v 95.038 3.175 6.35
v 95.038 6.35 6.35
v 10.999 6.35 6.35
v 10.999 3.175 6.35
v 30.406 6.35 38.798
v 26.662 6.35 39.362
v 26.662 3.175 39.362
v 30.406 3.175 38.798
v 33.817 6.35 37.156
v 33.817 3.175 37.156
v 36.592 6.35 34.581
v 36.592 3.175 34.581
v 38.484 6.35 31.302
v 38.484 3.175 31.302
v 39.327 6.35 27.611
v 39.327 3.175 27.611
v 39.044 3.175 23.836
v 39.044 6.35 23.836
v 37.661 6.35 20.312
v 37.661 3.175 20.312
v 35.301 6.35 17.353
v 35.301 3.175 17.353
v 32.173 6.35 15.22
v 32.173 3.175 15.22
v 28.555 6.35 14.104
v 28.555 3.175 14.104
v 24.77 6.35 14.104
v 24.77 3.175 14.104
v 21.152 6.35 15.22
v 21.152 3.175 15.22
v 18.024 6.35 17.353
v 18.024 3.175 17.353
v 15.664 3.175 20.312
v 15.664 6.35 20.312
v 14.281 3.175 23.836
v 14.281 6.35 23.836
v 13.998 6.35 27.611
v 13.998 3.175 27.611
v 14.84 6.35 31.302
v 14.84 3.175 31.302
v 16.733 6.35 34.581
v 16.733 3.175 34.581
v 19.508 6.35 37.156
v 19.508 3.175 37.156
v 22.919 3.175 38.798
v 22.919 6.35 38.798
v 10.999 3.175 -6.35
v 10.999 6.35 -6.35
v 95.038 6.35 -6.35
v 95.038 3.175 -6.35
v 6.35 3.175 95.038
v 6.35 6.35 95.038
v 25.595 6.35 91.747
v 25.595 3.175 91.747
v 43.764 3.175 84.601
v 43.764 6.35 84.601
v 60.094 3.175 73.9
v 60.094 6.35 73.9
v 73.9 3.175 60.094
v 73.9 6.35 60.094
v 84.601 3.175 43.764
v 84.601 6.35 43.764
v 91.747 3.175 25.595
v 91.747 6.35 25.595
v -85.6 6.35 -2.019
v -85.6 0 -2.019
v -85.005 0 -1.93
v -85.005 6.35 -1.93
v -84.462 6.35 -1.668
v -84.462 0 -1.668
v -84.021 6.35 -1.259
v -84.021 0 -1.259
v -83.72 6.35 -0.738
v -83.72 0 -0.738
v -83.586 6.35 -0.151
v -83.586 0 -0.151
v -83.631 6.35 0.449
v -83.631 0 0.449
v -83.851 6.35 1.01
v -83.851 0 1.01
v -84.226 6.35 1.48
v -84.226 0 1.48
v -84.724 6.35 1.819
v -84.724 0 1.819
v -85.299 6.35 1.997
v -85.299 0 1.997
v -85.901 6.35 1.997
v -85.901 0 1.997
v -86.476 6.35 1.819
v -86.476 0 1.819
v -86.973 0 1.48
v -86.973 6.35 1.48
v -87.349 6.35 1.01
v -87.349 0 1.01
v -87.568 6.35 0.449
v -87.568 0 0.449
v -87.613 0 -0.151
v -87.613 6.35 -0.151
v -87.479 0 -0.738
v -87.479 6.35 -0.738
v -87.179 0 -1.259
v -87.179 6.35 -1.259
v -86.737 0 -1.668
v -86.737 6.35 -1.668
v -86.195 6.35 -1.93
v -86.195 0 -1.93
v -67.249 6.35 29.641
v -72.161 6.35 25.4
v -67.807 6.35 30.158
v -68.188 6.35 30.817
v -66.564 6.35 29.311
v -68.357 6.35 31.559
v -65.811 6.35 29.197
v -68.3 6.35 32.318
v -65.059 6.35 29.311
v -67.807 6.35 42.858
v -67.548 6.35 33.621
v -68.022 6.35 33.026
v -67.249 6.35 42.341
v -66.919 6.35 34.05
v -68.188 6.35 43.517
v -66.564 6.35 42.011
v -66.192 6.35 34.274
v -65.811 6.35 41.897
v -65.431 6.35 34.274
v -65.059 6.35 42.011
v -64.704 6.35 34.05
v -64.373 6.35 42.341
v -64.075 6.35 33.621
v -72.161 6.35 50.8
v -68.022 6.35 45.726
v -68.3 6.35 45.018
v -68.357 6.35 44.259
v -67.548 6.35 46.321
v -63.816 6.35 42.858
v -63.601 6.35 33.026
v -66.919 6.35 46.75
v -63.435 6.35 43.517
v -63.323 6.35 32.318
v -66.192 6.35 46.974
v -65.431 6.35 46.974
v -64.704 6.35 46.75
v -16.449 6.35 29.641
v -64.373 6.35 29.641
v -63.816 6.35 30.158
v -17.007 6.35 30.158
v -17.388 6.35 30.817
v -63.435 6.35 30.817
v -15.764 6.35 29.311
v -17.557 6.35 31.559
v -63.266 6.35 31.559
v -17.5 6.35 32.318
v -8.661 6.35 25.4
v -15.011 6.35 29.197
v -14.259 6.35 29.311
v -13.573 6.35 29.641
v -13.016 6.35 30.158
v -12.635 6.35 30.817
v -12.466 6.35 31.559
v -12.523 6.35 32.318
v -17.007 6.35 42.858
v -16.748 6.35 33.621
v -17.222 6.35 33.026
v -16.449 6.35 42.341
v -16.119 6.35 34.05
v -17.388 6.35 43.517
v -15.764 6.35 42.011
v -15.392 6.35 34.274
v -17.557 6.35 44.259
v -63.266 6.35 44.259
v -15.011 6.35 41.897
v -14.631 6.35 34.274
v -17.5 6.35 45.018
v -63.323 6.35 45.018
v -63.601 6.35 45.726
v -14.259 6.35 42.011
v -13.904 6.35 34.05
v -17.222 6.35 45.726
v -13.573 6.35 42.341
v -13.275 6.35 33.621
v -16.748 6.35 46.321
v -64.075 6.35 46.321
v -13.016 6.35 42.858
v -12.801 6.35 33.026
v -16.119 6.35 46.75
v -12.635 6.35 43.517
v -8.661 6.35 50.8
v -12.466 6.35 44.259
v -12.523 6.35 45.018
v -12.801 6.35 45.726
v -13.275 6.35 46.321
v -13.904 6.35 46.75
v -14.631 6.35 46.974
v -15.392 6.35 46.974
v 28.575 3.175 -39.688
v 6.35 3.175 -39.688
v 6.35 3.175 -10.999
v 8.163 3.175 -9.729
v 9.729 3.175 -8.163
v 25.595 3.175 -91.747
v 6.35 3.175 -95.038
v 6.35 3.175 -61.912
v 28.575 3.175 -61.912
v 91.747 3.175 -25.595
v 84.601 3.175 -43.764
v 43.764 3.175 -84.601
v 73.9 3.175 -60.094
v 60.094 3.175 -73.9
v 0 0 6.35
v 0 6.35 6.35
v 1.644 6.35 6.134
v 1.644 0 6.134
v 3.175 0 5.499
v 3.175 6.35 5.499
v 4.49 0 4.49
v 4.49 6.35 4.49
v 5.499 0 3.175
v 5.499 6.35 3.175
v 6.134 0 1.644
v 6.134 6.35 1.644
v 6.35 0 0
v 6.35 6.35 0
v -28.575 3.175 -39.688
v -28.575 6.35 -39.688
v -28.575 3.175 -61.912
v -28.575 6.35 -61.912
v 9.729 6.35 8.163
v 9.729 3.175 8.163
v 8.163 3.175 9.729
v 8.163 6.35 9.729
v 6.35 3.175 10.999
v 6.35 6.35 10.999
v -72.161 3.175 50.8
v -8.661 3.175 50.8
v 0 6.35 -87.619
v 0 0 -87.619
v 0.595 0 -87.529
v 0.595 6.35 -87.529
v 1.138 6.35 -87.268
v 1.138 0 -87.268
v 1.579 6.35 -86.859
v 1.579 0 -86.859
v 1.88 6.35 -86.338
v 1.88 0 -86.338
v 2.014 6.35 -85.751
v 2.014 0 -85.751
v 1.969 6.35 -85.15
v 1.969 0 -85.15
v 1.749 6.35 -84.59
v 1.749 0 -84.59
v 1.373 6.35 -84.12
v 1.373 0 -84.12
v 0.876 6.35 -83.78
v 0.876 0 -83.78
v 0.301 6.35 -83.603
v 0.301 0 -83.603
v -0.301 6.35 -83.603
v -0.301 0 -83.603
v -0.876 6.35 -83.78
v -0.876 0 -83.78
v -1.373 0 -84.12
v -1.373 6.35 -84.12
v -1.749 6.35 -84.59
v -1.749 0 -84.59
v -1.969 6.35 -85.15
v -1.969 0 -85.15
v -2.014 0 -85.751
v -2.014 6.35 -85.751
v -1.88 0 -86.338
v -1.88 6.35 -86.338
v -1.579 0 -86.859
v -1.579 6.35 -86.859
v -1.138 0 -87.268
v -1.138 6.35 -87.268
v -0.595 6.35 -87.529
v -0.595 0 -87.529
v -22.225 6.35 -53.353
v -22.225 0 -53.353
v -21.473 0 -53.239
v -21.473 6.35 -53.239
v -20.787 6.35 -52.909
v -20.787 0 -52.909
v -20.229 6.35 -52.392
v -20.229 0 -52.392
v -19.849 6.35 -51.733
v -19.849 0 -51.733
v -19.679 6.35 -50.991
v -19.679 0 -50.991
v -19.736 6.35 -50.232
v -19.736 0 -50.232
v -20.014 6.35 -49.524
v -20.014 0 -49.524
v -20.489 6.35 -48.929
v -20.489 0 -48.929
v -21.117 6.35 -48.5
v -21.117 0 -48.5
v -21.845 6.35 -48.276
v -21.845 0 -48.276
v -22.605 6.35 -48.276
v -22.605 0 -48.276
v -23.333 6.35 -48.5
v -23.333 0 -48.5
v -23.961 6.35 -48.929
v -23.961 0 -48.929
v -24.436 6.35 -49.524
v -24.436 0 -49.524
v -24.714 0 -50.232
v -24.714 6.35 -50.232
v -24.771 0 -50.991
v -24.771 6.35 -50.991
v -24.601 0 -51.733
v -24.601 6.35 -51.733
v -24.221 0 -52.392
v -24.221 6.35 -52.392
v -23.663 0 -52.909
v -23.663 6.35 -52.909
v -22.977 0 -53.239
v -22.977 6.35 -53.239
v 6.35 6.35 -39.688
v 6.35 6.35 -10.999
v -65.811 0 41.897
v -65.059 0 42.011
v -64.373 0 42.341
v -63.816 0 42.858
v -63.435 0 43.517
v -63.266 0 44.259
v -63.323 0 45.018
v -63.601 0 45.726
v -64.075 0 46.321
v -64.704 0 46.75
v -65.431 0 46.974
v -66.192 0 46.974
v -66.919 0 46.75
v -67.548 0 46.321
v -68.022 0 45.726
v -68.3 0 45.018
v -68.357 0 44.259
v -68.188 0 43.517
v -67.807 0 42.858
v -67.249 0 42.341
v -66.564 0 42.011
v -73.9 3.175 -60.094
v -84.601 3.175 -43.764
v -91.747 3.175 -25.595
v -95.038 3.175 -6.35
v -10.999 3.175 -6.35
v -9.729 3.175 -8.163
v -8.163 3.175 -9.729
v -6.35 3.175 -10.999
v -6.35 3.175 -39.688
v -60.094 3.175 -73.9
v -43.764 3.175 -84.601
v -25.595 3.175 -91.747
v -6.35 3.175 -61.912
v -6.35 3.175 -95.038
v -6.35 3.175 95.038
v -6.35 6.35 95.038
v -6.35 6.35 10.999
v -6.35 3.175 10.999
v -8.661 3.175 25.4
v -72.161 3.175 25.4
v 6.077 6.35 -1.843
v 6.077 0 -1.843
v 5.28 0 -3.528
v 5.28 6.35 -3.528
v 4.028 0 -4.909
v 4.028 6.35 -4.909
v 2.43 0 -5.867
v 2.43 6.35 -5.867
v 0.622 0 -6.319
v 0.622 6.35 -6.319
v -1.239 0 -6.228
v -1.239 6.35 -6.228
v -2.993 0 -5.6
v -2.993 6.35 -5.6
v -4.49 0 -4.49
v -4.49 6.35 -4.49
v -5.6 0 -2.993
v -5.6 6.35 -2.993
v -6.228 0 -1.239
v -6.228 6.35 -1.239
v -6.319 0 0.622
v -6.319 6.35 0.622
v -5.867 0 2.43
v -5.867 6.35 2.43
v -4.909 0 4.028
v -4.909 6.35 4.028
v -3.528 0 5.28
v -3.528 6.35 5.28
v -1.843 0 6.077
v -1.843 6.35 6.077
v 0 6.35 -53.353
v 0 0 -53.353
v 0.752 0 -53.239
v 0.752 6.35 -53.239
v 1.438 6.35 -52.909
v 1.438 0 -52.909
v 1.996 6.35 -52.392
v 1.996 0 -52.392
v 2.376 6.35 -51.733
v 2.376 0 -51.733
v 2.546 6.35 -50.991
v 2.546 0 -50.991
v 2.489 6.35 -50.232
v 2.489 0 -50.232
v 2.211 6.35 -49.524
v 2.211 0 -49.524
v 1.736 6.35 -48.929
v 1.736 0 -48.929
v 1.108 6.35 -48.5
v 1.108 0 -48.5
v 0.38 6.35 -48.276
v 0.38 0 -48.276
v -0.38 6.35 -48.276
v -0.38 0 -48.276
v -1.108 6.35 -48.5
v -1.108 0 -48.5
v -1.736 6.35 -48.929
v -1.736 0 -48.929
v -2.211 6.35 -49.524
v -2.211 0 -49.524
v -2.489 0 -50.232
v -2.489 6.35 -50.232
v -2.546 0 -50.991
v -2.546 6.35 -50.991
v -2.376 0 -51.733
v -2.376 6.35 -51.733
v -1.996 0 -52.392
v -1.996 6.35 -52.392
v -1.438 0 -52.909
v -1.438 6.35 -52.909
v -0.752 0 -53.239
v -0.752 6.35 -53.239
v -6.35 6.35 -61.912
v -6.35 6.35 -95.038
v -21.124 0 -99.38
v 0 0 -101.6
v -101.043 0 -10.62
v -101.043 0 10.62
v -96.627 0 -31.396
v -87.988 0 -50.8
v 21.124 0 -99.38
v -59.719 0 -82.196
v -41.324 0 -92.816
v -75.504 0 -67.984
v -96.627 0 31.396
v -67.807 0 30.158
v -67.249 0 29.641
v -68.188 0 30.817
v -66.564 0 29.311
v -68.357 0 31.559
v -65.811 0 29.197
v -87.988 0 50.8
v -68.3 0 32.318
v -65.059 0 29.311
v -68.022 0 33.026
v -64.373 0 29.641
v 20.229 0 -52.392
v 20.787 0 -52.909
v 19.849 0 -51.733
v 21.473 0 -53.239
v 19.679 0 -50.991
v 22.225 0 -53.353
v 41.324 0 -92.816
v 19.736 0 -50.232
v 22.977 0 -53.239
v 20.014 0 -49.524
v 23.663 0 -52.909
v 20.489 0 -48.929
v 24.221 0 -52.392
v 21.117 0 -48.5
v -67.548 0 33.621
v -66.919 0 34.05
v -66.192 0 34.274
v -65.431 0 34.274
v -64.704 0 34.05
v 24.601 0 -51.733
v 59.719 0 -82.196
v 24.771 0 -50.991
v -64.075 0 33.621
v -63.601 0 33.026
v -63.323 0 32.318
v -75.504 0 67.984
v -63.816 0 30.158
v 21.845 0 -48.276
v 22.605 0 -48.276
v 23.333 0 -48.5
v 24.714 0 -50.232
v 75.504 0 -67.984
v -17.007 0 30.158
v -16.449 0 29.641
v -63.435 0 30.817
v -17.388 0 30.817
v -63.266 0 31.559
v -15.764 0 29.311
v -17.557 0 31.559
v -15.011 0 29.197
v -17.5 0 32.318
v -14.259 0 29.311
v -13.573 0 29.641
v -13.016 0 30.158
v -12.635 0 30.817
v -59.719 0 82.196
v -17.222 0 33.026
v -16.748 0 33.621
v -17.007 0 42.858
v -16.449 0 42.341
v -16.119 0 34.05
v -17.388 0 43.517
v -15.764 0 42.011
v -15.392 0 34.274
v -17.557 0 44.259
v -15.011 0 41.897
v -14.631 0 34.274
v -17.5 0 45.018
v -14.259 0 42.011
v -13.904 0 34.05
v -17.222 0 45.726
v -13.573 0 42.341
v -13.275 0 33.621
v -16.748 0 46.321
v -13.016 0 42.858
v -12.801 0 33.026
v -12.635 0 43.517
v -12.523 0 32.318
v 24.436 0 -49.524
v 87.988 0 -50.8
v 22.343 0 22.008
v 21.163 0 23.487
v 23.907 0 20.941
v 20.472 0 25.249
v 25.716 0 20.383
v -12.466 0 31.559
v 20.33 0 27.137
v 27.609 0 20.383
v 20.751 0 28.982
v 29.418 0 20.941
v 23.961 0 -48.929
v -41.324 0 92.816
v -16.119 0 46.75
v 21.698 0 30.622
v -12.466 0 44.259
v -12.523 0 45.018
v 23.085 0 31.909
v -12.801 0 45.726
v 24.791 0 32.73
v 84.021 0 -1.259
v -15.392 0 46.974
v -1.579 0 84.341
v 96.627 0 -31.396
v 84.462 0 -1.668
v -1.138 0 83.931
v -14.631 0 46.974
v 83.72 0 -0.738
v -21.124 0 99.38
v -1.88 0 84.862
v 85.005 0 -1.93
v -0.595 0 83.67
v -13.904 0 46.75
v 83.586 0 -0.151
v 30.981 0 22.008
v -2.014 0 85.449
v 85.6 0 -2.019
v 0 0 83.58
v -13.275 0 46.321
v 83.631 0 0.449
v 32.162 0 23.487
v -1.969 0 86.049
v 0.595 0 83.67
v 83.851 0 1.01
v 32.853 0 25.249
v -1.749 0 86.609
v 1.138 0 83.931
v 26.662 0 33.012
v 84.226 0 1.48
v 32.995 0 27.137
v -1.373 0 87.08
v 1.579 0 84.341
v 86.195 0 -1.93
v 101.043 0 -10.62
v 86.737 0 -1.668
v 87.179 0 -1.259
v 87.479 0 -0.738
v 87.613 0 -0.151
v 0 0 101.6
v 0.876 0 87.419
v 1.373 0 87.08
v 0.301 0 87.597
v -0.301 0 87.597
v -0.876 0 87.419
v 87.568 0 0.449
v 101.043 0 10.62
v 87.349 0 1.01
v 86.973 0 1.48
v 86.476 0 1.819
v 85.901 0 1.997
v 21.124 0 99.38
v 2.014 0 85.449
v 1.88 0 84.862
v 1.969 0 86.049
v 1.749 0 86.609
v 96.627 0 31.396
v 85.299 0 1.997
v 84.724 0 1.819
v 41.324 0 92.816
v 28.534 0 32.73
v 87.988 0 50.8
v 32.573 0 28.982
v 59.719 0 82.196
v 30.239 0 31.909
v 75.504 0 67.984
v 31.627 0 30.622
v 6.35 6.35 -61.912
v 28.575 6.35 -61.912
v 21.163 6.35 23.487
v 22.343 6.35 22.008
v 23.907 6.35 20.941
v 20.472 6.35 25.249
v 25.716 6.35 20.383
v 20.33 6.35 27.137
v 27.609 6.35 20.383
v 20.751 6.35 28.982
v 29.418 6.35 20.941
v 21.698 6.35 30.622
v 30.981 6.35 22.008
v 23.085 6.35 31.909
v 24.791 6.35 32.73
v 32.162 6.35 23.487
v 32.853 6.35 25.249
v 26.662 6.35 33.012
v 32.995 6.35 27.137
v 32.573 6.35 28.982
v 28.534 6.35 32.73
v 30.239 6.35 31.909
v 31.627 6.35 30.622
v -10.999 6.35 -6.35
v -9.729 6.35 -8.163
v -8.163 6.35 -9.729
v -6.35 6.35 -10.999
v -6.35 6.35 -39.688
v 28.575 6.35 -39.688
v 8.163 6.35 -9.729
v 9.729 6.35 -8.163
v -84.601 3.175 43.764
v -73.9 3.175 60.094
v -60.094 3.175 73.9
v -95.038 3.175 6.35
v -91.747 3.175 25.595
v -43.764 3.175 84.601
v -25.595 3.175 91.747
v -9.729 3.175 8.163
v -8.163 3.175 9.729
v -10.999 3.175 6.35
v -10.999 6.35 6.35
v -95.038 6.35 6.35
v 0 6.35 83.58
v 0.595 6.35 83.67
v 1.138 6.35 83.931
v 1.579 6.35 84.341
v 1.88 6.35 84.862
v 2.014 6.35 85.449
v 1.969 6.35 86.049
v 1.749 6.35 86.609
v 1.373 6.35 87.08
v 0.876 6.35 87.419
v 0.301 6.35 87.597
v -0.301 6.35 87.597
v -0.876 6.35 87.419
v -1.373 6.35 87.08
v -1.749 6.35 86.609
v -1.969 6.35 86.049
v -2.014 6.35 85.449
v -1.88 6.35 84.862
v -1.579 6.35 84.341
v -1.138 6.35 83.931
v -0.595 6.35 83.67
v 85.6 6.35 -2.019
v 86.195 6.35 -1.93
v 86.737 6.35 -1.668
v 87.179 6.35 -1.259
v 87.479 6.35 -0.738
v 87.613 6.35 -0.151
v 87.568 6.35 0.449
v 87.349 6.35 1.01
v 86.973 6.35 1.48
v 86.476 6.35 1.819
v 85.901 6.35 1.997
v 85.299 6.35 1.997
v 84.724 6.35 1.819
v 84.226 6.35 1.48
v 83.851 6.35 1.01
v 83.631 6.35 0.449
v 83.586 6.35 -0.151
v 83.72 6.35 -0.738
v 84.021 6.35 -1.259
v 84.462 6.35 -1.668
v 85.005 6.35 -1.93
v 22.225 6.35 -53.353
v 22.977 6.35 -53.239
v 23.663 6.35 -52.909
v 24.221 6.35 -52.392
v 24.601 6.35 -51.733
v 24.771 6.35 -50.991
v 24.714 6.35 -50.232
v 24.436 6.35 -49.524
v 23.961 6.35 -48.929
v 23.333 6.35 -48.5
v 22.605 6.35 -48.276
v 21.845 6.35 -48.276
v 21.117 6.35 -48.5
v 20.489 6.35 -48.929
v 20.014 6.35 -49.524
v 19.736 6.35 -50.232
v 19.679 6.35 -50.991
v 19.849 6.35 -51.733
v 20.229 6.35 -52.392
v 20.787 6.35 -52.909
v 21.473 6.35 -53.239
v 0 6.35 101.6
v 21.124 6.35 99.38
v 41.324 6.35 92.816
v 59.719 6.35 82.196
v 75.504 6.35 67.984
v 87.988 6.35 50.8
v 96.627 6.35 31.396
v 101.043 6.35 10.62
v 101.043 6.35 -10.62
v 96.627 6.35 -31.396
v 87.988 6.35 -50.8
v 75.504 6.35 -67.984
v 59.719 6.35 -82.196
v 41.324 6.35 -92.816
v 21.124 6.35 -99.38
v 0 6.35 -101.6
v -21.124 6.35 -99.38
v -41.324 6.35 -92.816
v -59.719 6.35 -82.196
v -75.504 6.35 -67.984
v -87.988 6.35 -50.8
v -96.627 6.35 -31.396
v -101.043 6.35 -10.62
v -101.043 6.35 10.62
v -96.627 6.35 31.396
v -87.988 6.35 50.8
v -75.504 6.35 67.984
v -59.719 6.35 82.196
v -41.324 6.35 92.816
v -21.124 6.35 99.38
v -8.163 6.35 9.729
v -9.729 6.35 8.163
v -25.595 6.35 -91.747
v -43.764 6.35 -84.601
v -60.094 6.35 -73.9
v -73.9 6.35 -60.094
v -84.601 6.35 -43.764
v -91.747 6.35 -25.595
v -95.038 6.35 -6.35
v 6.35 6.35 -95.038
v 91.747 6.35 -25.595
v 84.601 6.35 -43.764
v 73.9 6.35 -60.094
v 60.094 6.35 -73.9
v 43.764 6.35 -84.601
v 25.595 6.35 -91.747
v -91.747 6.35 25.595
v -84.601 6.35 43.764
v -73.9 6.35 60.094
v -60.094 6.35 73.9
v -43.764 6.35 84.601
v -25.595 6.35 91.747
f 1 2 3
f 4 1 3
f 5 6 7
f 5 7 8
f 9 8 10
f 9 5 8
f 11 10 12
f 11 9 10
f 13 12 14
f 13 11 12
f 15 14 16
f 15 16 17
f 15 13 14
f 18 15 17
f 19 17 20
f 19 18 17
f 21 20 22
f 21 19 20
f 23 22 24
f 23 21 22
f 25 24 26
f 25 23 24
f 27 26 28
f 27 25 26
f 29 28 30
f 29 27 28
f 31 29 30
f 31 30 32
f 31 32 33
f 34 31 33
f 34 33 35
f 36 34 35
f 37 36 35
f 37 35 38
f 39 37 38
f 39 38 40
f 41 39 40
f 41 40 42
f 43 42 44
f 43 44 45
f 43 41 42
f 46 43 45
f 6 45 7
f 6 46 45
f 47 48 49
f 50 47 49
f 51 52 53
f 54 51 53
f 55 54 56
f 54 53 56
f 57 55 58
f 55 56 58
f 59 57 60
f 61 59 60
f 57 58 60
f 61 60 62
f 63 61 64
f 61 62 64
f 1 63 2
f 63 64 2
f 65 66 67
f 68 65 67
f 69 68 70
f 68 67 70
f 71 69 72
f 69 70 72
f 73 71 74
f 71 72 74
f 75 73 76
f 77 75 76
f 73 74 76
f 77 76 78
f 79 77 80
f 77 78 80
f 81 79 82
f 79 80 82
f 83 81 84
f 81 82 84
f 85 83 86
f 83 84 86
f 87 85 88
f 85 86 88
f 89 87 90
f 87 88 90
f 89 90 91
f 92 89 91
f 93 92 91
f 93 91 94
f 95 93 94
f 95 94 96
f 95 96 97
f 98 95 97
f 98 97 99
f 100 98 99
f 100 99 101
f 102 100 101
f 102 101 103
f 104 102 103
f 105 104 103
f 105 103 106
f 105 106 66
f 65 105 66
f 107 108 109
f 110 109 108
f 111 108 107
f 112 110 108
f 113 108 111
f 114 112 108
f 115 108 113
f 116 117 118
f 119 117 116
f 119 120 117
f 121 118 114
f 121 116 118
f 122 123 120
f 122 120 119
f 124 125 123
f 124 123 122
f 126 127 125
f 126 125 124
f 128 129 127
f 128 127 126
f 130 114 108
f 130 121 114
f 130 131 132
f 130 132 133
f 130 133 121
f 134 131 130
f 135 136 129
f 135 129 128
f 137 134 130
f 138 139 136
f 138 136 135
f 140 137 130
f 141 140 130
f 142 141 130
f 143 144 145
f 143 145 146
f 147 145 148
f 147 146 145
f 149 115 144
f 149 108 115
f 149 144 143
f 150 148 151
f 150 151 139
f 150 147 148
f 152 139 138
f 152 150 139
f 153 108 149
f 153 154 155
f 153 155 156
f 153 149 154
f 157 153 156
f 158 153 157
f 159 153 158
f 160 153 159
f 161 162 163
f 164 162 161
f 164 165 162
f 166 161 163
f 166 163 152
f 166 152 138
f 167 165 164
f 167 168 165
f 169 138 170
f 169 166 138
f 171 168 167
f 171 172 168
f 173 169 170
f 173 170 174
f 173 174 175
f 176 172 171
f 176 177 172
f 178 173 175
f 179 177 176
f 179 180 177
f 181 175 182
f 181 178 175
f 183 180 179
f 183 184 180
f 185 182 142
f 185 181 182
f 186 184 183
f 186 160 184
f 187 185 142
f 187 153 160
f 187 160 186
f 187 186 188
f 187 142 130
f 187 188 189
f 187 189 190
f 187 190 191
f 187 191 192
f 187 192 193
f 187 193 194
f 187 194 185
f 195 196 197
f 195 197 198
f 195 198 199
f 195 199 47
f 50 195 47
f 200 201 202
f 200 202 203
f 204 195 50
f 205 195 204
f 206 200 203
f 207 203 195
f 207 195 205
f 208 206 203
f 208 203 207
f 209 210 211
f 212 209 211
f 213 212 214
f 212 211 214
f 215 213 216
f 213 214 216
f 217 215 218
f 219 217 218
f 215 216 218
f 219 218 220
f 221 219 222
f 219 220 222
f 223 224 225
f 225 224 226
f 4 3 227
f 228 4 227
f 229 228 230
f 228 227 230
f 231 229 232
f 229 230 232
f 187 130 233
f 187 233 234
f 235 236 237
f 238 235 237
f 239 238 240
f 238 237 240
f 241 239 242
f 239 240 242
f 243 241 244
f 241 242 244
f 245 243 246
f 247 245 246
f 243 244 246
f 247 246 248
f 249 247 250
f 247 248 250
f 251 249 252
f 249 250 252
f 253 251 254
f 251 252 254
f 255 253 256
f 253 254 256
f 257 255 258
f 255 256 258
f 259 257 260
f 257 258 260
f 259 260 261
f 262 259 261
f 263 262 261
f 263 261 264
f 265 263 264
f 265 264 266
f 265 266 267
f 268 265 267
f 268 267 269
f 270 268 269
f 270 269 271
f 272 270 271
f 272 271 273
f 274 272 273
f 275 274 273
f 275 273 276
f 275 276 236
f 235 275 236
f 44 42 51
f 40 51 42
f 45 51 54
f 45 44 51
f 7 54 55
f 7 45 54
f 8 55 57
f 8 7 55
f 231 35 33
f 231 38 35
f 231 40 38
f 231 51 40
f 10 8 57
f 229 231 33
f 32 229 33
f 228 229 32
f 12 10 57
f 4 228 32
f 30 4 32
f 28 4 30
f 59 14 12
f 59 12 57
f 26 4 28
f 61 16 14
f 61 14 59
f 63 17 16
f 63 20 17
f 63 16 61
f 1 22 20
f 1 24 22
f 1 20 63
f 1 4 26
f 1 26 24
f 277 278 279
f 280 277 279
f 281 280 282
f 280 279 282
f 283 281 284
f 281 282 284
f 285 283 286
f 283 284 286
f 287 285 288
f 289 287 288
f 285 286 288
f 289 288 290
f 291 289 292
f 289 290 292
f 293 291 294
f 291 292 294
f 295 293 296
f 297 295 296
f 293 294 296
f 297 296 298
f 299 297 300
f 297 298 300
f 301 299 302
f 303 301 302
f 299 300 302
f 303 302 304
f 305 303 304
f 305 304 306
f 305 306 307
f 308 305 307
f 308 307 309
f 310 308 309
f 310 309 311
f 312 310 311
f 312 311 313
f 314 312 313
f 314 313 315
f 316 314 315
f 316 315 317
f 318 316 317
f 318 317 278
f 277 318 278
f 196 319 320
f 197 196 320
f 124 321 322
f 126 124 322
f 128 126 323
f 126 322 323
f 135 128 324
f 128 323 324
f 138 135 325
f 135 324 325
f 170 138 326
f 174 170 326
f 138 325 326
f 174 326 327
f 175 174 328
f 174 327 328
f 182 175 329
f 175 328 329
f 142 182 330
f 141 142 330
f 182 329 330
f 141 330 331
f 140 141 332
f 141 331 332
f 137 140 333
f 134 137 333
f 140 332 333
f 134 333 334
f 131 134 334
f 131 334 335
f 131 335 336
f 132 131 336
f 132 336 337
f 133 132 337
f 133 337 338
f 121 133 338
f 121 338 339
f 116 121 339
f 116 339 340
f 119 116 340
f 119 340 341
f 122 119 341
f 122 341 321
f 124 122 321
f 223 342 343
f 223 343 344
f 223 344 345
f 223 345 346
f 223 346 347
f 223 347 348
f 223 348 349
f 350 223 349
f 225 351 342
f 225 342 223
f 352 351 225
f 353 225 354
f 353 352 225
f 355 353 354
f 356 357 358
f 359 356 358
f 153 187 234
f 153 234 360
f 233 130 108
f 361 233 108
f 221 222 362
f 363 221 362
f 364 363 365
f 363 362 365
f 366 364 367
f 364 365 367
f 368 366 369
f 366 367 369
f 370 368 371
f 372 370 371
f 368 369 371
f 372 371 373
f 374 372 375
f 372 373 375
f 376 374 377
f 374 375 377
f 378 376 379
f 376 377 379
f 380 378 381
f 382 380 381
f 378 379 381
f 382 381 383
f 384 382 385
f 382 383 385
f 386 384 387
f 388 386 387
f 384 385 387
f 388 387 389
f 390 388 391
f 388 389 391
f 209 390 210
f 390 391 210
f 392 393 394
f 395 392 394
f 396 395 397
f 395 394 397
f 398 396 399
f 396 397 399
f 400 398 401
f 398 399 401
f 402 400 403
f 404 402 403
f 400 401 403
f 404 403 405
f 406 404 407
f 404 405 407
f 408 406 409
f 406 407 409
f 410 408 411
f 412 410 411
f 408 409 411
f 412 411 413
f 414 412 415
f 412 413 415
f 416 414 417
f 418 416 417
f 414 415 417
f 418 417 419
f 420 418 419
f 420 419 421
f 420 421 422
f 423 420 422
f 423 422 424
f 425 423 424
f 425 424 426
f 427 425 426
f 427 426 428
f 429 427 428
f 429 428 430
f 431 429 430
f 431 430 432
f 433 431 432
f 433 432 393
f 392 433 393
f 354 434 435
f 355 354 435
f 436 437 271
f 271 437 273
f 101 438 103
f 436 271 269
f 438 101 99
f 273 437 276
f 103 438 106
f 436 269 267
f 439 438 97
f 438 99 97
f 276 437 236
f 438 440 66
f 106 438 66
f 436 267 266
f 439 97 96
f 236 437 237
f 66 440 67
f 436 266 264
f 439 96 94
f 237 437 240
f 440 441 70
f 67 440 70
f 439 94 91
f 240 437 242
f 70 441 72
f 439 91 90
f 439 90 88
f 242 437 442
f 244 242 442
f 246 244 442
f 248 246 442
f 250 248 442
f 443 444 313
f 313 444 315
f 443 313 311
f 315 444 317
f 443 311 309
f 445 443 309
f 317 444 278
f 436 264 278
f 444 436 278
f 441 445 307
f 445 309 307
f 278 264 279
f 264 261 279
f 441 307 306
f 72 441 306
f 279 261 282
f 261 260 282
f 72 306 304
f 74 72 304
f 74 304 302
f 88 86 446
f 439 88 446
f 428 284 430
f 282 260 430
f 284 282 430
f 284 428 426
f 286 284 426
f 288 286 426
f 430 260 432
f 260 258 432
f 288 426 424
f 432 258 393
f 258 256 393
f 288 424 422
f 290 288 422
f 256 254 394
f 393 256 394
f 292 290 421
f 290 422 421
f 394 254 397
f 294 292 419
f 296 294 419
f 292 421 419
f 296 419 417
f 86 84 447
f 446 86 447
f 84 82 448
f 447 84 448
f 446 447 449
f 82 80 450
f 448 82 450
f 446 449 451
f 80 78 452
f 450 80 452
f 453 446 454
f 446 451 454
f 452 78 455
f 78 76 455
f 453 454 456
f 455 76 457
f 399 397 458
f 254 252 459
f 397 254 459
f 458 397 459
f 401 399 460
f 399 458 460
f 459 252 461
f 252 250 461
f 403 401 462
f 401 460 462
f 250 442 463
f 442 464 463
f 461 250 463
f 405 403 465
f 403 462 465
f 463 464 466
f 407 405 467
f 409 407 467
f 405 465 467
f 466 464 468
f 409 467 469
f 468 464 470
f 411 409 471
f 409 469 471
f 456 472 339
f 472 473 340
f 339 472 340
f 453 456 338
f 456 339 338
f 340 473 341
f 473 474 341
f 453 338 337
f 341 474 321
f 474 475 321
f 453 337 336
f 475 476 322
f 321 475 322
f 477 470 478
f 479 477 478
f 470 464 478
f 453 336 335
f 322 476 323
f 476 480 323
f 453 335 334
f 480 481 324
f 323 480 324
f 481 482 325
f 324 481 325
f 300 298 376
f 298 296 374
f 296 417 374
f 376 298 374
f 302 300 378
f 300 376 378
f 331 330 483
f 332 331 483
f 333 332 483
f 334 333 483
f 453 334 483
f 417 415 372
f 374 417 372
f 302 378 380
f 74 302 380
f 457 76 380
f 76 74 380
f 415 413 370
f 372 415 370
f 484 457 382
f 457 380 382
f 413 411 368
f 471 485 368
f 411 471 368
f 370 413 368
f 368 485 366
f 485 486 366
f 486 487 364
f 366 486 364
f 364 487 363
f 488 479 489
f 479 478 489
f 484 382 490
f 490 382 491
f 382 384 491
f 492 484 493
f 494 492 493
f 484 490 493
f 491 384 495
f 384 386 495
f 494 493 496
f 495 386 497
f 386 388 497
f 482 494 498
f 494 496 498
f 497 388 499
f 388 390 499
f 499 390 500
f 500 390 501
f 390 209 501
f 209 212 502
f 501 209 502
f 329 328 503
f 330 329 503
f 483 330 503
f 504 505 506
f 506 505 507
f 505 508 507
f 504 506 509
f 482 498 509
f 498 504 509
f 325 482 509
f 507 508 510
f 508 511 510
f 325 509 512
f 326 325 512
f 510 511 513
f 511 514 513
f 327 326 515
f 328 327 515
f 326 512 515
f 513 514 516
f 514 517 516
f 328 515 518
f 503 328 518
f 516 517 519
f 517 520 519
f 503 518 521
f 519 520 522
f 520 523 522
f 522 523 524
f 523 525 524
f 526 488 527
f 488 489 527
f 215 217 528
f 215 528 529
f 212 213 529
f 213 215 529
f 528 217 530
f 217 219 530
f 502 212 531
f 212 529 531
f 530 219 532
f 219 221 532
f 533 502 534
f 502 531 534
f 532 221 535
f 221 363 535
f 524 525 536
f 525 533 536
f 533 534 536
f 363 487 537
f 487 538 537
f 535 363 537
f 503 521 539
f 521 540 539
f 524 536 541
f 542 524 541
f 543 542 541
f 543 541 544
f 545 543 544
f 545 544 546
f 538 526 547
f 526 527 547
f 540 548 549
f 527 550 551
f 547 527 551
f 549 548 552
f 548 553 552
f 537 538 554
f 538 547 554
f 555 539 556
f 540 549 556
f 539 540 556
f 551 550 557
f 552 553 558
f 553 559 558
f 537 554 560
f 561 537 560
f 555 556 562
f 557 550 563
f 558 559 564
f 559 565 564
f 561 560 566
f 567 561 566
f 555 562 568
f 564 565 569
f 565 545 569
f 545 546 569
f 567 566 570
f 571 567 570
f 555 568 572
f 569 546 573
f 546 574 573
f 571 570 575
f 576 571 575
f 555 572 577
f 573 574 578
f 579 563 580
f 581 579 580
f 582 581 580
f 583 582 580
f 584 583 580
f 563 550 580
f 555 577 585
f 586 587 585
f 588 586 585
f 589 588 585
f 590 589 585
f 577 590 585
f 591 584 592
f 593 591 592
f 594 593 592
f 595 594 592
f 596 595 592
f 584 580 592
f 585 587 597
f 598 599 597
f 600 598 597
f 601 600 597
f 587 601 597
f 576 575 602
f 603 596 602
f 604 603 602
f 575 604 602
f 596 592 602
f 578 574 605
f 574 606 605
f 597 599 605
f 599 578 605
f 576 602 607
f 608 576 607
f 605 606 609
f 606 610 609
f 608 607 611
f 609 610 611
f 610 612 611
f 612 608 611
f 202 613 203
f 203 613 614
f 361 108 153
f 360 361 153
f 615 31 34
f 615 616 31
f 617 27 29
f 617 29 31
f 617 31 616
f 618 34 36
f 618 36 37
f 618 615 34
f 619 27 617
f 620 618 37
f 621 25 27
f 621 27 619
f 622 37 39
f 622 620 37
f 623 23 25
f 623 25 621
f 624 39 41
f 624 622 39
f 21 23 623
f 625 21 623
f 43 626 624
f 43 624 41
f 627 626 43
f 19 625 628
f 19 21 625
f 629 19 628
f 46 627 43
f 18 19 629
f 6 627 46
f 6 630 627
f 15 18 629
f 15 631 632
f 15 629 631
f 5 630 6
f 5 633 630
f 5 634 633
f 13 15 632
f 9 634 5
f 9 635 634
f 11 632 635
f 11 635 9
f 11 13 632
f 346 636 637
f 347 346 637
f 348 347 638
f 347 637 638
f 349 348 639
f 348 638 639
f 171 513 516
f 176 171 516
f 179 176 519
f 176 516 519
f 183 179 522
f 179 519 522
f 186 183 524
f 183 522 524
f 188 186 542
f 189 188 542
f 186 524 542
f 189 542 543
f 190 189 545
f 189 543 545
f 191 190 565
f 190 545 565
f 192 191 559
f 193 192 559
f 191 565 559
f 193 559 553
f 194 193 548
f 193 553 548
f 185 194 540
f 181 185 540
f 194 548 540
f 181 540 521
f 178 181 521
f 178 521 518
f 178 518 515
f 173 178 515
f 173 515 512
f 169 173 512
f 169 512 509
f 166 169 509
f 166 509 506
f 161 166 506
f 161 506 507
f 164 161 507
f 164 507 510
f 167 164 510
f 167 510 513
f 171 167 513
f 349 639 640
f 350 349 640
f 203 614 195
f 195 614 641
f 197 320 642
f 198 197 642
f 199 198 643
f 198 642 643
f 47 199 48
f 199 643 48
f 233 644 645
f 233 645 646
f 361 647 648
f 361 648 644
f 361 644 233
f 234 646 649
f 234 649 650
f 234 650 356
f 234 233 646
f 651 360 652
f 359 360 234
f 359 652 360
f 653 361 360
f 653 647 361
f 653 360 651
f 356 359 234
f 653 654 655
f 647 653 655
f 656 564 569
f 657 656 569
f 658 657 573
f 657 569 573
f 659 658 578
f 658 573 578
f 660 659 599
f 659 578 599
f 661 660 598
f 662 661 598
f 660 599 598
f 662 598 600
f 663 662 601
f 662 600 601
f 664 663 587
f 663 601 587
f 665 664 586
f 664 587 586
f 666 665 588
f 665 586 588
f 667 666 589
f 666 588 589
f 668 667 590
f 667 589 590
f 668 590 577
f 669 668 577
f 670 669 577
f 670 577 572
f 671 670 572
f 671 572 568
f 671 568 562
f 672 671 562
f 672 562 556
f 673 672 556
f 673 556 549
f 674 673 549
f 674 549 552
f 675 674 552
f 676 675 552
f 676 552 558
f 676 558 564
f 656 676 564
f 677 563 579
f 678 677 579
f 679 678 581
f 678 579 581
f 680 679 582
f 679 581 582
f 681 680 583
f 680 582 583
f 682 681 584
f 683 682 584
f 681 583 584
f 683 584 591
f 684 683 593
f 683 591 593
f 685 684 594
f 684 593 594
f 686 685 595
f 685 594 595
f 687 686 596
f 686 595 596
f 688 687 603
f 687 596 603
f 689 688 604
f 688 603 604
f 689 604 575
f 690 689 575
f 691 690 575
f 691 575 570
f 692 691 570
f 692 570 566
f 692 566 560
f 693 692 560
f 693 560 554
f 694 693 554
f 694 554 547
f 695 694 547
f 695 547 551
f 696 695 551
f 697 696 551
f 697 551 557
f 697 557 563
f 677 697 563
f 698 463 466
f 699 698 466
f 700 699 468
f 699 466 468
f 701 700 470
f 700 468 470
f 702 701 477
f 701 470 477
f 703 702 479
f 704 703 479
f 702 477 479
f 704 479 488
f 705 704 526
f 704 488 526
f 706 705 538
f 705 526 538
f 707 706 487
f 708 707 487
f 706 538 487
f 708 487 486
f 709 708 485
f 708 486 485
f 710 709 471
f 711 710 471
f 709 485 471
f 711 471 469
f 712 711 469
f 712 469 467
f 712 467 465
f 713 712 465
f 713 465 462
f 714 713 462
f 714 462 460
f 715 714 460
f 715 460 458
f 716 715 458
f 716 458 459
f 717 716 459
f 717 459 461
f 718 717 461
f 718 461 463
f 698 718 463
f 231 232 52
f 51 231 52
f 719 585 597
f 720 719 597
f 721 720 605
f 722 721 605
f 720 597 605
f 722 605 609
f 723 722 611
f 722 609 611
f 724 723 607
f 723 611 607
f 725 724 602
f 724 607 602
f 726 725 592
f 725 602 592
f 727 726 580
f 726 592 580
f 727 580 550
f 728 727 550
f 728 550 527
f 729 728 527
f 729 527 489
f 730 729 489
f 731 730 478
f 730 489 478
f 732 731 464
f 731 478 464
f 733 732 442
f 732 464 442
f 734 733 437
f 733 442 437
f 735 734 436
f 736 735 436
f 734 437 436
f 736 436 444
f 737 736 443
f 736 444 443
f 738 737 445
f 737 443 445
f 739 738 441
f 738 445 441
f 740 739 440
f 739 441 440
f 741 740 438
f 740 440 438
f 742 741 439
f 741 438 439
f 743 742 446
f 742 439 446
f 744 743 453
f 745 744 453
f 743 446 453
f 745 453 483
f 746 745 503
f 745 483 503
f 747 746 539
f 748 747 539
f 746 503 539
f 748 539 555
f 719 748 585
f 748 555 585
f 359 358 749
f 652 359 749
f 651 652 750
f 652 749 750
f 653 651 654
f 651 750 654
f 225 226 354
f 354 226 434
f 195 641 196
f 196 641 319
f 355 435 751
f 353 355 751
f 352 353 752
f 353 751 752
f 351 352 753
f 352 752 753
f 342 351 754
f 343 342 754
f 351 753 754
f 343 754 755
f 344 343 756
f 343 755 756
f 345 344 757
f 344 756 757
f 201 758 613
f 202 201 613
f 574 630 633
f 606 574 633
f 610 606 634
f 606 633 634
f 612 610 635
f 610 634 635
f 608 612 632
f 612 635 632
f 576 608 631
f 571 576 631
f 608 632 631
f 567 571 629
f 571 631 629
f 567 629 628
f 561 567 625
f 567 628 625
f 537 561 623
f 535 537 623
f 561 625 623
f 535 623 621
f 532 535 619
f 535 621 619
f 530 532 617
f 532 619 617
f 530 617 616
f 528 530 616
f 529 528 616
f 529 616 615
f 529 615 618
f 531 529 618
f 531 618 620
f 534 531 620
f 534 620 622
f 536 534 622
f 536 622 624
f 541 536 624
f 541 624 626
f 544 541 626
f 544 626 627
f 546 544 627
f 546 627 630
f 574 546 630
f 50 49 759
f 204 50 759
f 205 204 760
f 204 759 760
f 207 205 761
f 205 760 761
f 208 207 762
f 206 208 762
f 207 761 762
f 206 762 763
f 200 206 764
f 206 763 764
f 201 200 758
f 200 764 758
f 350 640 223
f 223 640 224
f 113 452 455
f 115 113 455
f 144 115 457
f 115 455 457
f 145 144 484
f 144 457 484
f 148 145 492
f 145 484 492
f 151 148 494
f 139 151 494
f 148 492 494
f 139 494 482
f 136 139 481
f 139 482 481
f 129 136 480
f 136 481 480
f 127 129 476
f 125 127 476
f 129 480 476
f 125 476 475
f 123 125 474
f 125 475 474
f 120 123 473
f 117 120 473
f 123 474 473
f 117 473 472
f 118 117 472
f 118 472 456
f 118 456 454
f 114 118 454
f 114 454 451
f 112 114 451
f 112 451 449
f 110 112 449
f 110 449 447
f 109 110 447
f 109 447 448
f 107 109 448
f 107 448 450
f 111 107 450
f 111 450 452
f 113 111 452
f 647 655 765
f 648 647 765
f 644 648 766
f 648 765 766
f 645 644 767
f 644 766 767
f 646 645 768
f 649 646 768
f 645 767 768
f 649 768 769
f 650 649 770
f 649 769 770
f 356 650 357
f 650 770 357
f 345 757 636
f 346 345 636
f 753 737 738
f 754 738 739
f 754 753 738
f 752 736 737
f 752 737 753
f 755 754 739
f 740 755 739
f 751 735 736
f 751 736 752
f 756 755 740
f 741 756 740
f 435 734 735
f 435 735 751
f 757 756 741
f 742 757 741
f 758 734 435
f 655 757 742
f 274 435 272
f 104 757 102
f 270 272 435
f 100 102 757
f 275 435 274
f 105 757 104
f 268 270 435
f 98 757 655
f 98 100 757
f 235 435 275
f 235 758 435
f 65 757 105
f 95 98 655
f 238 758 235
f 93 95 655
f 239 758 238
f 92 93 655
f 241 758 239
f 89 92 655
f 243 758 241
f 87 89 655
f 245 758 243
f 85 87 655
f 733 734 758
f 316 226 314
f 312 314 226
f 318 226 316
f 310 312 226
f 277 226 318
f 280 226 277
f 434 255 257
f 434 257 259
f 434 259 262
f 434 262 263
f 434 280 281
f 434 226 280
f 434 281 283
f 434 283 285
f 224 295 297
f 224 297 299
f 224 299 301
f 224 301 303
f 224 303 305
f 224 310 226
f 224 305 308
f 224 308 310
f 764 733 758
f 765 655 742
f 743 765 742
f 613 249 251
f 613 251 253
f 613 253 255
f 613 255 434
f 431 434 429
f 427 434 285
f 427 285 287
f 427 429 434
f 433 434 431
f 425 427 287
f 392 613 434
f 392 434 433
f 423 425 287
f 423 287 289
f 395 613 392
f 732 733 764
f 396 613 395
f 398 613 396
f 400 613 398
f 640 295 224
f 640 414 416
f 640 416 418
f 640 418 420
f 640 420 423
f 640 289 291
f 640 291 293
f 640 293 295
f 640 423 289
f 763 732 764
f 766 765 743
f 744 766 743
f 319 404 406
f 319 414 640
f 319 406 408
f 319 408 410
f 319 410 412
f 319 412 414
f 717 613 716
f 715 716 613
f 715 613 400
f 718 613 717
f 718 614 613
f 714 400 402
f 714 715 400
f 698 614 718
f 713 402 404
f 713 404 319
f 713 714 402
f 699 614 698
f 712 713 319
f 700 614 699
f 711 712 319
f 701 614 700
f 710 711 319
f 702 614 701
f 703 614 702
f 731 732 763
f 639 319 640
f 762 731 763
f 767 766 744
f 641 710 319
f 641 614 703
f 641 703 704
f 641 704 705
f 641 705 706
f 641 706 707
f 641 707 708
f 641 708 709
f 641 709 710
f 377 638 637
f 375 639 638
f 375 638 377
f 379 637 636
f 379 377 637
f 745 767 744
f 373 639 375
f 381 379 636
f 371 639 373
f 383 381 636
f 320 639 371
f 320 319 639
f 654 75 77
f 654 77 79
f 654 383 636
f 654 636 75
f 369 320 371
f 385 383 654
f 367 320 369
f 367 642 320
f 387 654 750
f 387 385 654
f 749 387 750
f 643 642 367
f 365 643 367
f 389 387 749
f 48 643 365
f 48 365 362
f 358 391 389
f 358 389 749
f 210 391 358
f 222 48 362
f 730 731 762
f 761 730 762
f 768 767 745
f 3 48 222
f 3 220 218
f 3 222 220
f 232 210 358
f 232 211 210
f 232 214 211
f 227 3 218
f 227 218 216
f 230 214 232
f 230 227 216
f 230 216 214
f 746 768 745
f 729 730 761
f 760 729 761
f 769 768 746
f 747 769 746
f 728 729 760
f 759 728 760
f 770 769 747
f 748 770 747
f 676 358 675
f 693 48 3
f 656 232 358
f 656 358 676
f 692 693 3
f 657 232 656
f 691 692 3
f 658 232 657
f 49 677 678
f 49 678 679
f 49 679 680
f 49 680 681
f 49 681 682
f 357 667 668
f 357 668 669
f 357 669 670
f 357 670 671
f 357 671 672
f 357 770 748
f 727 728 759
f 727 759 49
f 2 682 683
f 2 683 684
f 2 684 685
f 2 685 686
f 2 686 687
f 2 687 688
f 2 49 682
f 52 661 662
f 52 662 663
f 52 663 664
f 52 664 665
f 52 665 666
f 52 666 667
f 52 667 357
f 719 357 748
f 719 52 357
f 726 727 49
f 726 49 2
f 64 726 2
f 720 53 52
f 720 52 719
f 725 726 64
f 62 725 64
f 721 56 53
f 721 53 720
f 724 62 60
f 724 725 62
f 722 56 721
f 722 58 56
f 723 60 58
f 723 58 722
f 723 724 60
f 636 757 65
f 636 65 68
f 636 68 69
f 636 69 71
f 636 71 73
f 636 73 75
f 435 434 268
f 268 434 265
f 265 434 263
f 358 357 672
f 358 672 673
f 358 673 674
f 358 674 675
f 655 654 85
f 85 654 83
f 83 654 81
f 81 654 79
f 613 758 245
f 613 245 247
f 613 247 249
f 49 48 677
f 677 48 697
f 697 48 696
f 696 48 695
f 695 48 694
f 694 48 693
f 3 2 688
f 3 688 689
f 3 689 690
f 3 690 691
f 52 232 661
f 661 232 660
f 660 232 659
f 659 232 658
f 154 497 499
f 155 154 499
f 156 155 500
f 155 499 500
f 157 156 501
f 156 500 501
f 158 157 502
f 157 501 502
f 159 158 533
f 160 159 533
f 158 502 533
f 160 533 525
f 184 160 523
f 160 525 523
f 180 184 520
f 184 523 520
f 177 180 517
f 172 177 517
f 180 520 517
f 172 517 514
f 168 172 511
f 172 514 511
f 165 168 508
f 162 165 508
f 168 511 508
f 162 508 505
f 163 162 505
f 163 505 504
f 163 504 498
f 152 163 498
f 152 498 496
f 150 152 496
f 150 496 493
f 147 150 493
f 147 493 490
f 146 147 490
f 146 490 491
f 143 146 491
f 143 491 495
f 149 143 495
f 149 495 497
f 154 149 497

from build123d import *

# Parameters (mm, degrees)
SKETCH3_R                   = 101.6
BOSS_EXTRUDE1_DEPTH         = 6.35
SKETCH4_R                   = 6.35
CUT_EXTRUDE1_DEPTH          = 144.824345992
F_10_32_TAPPED_HOLE1_D      = 4.0386
F_10_32_TAPPED_HOLE1_DEPTH  = 13.716
F_10_32_TAPPED_HOLE1_TIP    = 1.213317848
SKETCH6_W                   = 63.5
SKETCH6_H                   = 25.4
SKETCH6_R                   = 12.7
CUT_EXTRUDE2_DEPTH          = 3.175
F_1_4_20_TAPPED_HOLE2_D     = 5.1054
F_1_4_20_TAPPED_HOLE2_DEPTH = 19.05
F_1_4_20_TAPPED_HOLE2_TIP   = 1.533816902
F_1_4_20_TAPPED_HOLE4_D     = 5.1054
F_1_4_20_TAPPED_HOLE4_DEPTH = 19.05
F_1_4_20_TAPPED_HOLE4_TIP   = 1.533816902


with BuildPart() as part:
    # Sketch3 → Boss-Extrude1 (new body)
    with BuildSketch(Plane(origin=(0, 0, 0), x_dir=(1, 0, 0), z_dir=(0, 1, 0))):
        with Locations(Location((0, 0, 0), (0, 0, 270))):
            Circle(SKETCH3_R)
    extrude(amount=BOSS_EXTRUDE1_DEPTH)

    # Sketch4 → Cut-Extrude1 (cut, through all)
    with BuildSketch(Plane(origin=(0, 6.35, 0), x_dir=(1, 0, 0), z_dir=(0, 1, 0))):
        with BuildLine():
            ThreePointArc((0, -6.35), (4.490128061, -4.490128061), (6.35, 0))
            Line((6.35, 0), (0, 0))
            Line((0, 0), (0, -6.35))
        make_face()
        with BuildLine():
            Line((0, 0), (6.35, 0))
            ThreePointArc((6.35, 0), (-4.490128061, 4.490128061), (0, -6.35))
            Line((0, -6.35), (0, 0))
        make_face()
        with Locations(Location((26.662380423, -26.662380423, 0), (0, 0, 270))):
            Circle(SKETCH4_R)
    extrude(amount=-CUT_EXTRUDE1_DEPTH, mode=Mode.SUBTRACT)

    # #10-32 Tapped Hole1
    with Locations(Plane(origin=(0, 6.35, -85.599778), x_dir=(0, 0, 1), z_dir=(0, 1, 0))):
        with Locations((0, 0), (85.599778, -85.599778), (171.199556, 0), (85.599778, 85.599778)):
            Hole(F_10_32_TAPPED_HOLE1_D / 2, depth=F_10_32_TAPPED_HOLE1_DEPTH)
            with Locations((0, 0, -(F_10_32_TAPPED_HOLE1_DEPTH + F_10_32_TAPPED_HOLE1_TIP / 2))):  # 118° drill point
                Cone(0, F_10_32_TAPPED_HOLE1_D / 2, F_10_32_TAPPED_HOLE1_TIP, mode=Mode.SUBTRACT)

    # Sketch6 → Cut-Extrude2 (cut)
    # profile 1 of 4: a face of its own
    with BuildSketch(Plane(origin=(0, 6.35, 0), x_dir=(1, 0, 0), z_dir=(0, 1, 0))):
        with BuildLine():
            Line((-28.575, 61.9125), (-6.35, 61.9125))
            Line((-6.35, 61.9125), (-6.35, 95.038097624))
            ThreePointArc((-6.35, 95.038097624), (-67.351920908, 67.351920908), (-95.038097624, 6.35))
            Line((-95.038097624, 6.35), (-10.998522628, 6.35))
            ThreePointArc((-10.998522628, 6.35), (-8.980256121, 8.980256121), (-6.35, 10.998522628))
            Line((-6.35, 10.998522628), (-6.35, 39.6875))
            Line((-6.35, 39.6875), (-28.575, 39.6875))
            Line((-28.575, 39.6875), (-28.575, 61.9125))
        make_face()
    # profile 2 of 4: a face of its own
    with BuildSketch(Plane(origin=(0, 6.35, 0), x_dir=(1, 0, 0), z_dir=(0, 1, 0))):
        with BuildLine():
            Line((6.35, 95.038097624), (6.35, 61.9125))
            Line((6.35, 61.9125), (28.575, 61.9125))
            Line((28.575, 61.9125), (28.575, 39.6875))
            Line((28.575, 39.6875), (6.35, 39.6875))
            Line((6.35, 39.6875), (6.35, 10.998522628))
            ThreePointArc((6.35, 10.998522628), (8.980256121, 8.980256121), (10.998522628, 6.35))
            Line((10.998522628, 6.35), (95.038097624, 6.35))
            ThreePointArc((95.038097624, 6.35), (67.351920908, 67.351920908), (6.35, 95.038097624))
        make_face()
    # profile 3 of 4: a face of its own
    with BuildSketch(Plane(origin=(0, 6.35, 0), x_dir=(1, 0, 0), z_dir=(0, 1, 0))):
        with BuildLine():
            ThreePointArc((-6.35, -10.998522628), (-8.980256121, -8.980256121), (-10.998522628, -6.35))
            Line((-10.998522628, -6.35), (-95.038097624, -6.35))
            ThreePointArc((-95.038097624, -6.35), (-67.351920908, -67.351920908), (-6.35, -95.038097624))
            Line((-6.35, -95.038097624), (-6.35, -10.998522628))
        make_face()
        with Locations((-40.4114, -38.1)):
            Rectangle(SKETCH6_W, SKETCH6_H, mode=Mode.SUBTRACT)
    # profile 4 of 4: a face of its own
    with BuildSketch(Plane(origin=(0, 6.35, 0), x_dir=(1, 0, 0), z_dir=(0, 1, 0))):
        with BuildLine():
            Line((95.038097624, -6.35), (10.998522628, -6.35))
            ThreePointArc((10.998522628, -6.35), (8.980256121, -8.980256121), (6.35, -10.998522628))
            Line((6.35, -10.998522628), (6.35, -95.038097624))
            ThreePointArc((6.35, -95.038097624), (67.351920908, -67.351920908), (95.038097624, -6.35))
        make_face()
        with Locations(Location((26.662380423, -26.662380423, 0), (0, 0, 270))):
            Circle(SKETCH6_R, mode=Mode.SUBTRACT)
    extrude(amount=-CUT_EXTRUDE2_DEPTH, mode=Mode.SUBTRACT)

    # 1/4-20 Tapped Hole2
    with Locations(Plane(origin=(-22.225, 6.35, -50.8), x_dir=(0, 0, 1), z_dir=(0, 1, 0))):
        with Locations((0, 0), (0, 44.45), (0, 22.225)):
            Hole(F_1_4_20_TAPPED_HOLE2_D / 2, depth=F_1_4_20_TAPPED_HOLE2_DEPTH)
            with Locations((0, 0, -(F_1_4_20_TAPPED_HOLE2_DEPTH + F_1_4_20_TAPPED_HOLE2_TIP / 2))):  # 118° drill point
                Cone(0, F_1_4_20_TAPPED_HOLE2_D / 2, F_1_4_20_TAPPED_HOLE2_TIP, mode=Mode.SUBTRACT)

    # 1/4-20 Tapped Hole4
    with Locations(Plane(origin=(-65.8114, 6.35, 31.75), x_dir=(0, 0, 1), z_dir=(0, 1, 0))):
        with Locations((0, 0), (12.7, 0), (12.7, 50.8), (0, 50.8)):
            Hole(F_1_4_20_TAPPED_HOLE4_D / 2, depth=F_1_4_20_TAPPED_HOLE4_DEPTH)
            with Locations((0, 0, -(F_1_4_20_TAPPED_HOLE4_DEPTH + F_1_4_20_TAPPED_HOLE4_TIP / 2))):  # 118° drill point
                Cone(0, F_1_4_20_TAPPED_HOLE4_D / 2, F_1_4_20_TAPPED_HOLE4_TIP, mode=Mode.SUBTRACT)


solid = part.part
